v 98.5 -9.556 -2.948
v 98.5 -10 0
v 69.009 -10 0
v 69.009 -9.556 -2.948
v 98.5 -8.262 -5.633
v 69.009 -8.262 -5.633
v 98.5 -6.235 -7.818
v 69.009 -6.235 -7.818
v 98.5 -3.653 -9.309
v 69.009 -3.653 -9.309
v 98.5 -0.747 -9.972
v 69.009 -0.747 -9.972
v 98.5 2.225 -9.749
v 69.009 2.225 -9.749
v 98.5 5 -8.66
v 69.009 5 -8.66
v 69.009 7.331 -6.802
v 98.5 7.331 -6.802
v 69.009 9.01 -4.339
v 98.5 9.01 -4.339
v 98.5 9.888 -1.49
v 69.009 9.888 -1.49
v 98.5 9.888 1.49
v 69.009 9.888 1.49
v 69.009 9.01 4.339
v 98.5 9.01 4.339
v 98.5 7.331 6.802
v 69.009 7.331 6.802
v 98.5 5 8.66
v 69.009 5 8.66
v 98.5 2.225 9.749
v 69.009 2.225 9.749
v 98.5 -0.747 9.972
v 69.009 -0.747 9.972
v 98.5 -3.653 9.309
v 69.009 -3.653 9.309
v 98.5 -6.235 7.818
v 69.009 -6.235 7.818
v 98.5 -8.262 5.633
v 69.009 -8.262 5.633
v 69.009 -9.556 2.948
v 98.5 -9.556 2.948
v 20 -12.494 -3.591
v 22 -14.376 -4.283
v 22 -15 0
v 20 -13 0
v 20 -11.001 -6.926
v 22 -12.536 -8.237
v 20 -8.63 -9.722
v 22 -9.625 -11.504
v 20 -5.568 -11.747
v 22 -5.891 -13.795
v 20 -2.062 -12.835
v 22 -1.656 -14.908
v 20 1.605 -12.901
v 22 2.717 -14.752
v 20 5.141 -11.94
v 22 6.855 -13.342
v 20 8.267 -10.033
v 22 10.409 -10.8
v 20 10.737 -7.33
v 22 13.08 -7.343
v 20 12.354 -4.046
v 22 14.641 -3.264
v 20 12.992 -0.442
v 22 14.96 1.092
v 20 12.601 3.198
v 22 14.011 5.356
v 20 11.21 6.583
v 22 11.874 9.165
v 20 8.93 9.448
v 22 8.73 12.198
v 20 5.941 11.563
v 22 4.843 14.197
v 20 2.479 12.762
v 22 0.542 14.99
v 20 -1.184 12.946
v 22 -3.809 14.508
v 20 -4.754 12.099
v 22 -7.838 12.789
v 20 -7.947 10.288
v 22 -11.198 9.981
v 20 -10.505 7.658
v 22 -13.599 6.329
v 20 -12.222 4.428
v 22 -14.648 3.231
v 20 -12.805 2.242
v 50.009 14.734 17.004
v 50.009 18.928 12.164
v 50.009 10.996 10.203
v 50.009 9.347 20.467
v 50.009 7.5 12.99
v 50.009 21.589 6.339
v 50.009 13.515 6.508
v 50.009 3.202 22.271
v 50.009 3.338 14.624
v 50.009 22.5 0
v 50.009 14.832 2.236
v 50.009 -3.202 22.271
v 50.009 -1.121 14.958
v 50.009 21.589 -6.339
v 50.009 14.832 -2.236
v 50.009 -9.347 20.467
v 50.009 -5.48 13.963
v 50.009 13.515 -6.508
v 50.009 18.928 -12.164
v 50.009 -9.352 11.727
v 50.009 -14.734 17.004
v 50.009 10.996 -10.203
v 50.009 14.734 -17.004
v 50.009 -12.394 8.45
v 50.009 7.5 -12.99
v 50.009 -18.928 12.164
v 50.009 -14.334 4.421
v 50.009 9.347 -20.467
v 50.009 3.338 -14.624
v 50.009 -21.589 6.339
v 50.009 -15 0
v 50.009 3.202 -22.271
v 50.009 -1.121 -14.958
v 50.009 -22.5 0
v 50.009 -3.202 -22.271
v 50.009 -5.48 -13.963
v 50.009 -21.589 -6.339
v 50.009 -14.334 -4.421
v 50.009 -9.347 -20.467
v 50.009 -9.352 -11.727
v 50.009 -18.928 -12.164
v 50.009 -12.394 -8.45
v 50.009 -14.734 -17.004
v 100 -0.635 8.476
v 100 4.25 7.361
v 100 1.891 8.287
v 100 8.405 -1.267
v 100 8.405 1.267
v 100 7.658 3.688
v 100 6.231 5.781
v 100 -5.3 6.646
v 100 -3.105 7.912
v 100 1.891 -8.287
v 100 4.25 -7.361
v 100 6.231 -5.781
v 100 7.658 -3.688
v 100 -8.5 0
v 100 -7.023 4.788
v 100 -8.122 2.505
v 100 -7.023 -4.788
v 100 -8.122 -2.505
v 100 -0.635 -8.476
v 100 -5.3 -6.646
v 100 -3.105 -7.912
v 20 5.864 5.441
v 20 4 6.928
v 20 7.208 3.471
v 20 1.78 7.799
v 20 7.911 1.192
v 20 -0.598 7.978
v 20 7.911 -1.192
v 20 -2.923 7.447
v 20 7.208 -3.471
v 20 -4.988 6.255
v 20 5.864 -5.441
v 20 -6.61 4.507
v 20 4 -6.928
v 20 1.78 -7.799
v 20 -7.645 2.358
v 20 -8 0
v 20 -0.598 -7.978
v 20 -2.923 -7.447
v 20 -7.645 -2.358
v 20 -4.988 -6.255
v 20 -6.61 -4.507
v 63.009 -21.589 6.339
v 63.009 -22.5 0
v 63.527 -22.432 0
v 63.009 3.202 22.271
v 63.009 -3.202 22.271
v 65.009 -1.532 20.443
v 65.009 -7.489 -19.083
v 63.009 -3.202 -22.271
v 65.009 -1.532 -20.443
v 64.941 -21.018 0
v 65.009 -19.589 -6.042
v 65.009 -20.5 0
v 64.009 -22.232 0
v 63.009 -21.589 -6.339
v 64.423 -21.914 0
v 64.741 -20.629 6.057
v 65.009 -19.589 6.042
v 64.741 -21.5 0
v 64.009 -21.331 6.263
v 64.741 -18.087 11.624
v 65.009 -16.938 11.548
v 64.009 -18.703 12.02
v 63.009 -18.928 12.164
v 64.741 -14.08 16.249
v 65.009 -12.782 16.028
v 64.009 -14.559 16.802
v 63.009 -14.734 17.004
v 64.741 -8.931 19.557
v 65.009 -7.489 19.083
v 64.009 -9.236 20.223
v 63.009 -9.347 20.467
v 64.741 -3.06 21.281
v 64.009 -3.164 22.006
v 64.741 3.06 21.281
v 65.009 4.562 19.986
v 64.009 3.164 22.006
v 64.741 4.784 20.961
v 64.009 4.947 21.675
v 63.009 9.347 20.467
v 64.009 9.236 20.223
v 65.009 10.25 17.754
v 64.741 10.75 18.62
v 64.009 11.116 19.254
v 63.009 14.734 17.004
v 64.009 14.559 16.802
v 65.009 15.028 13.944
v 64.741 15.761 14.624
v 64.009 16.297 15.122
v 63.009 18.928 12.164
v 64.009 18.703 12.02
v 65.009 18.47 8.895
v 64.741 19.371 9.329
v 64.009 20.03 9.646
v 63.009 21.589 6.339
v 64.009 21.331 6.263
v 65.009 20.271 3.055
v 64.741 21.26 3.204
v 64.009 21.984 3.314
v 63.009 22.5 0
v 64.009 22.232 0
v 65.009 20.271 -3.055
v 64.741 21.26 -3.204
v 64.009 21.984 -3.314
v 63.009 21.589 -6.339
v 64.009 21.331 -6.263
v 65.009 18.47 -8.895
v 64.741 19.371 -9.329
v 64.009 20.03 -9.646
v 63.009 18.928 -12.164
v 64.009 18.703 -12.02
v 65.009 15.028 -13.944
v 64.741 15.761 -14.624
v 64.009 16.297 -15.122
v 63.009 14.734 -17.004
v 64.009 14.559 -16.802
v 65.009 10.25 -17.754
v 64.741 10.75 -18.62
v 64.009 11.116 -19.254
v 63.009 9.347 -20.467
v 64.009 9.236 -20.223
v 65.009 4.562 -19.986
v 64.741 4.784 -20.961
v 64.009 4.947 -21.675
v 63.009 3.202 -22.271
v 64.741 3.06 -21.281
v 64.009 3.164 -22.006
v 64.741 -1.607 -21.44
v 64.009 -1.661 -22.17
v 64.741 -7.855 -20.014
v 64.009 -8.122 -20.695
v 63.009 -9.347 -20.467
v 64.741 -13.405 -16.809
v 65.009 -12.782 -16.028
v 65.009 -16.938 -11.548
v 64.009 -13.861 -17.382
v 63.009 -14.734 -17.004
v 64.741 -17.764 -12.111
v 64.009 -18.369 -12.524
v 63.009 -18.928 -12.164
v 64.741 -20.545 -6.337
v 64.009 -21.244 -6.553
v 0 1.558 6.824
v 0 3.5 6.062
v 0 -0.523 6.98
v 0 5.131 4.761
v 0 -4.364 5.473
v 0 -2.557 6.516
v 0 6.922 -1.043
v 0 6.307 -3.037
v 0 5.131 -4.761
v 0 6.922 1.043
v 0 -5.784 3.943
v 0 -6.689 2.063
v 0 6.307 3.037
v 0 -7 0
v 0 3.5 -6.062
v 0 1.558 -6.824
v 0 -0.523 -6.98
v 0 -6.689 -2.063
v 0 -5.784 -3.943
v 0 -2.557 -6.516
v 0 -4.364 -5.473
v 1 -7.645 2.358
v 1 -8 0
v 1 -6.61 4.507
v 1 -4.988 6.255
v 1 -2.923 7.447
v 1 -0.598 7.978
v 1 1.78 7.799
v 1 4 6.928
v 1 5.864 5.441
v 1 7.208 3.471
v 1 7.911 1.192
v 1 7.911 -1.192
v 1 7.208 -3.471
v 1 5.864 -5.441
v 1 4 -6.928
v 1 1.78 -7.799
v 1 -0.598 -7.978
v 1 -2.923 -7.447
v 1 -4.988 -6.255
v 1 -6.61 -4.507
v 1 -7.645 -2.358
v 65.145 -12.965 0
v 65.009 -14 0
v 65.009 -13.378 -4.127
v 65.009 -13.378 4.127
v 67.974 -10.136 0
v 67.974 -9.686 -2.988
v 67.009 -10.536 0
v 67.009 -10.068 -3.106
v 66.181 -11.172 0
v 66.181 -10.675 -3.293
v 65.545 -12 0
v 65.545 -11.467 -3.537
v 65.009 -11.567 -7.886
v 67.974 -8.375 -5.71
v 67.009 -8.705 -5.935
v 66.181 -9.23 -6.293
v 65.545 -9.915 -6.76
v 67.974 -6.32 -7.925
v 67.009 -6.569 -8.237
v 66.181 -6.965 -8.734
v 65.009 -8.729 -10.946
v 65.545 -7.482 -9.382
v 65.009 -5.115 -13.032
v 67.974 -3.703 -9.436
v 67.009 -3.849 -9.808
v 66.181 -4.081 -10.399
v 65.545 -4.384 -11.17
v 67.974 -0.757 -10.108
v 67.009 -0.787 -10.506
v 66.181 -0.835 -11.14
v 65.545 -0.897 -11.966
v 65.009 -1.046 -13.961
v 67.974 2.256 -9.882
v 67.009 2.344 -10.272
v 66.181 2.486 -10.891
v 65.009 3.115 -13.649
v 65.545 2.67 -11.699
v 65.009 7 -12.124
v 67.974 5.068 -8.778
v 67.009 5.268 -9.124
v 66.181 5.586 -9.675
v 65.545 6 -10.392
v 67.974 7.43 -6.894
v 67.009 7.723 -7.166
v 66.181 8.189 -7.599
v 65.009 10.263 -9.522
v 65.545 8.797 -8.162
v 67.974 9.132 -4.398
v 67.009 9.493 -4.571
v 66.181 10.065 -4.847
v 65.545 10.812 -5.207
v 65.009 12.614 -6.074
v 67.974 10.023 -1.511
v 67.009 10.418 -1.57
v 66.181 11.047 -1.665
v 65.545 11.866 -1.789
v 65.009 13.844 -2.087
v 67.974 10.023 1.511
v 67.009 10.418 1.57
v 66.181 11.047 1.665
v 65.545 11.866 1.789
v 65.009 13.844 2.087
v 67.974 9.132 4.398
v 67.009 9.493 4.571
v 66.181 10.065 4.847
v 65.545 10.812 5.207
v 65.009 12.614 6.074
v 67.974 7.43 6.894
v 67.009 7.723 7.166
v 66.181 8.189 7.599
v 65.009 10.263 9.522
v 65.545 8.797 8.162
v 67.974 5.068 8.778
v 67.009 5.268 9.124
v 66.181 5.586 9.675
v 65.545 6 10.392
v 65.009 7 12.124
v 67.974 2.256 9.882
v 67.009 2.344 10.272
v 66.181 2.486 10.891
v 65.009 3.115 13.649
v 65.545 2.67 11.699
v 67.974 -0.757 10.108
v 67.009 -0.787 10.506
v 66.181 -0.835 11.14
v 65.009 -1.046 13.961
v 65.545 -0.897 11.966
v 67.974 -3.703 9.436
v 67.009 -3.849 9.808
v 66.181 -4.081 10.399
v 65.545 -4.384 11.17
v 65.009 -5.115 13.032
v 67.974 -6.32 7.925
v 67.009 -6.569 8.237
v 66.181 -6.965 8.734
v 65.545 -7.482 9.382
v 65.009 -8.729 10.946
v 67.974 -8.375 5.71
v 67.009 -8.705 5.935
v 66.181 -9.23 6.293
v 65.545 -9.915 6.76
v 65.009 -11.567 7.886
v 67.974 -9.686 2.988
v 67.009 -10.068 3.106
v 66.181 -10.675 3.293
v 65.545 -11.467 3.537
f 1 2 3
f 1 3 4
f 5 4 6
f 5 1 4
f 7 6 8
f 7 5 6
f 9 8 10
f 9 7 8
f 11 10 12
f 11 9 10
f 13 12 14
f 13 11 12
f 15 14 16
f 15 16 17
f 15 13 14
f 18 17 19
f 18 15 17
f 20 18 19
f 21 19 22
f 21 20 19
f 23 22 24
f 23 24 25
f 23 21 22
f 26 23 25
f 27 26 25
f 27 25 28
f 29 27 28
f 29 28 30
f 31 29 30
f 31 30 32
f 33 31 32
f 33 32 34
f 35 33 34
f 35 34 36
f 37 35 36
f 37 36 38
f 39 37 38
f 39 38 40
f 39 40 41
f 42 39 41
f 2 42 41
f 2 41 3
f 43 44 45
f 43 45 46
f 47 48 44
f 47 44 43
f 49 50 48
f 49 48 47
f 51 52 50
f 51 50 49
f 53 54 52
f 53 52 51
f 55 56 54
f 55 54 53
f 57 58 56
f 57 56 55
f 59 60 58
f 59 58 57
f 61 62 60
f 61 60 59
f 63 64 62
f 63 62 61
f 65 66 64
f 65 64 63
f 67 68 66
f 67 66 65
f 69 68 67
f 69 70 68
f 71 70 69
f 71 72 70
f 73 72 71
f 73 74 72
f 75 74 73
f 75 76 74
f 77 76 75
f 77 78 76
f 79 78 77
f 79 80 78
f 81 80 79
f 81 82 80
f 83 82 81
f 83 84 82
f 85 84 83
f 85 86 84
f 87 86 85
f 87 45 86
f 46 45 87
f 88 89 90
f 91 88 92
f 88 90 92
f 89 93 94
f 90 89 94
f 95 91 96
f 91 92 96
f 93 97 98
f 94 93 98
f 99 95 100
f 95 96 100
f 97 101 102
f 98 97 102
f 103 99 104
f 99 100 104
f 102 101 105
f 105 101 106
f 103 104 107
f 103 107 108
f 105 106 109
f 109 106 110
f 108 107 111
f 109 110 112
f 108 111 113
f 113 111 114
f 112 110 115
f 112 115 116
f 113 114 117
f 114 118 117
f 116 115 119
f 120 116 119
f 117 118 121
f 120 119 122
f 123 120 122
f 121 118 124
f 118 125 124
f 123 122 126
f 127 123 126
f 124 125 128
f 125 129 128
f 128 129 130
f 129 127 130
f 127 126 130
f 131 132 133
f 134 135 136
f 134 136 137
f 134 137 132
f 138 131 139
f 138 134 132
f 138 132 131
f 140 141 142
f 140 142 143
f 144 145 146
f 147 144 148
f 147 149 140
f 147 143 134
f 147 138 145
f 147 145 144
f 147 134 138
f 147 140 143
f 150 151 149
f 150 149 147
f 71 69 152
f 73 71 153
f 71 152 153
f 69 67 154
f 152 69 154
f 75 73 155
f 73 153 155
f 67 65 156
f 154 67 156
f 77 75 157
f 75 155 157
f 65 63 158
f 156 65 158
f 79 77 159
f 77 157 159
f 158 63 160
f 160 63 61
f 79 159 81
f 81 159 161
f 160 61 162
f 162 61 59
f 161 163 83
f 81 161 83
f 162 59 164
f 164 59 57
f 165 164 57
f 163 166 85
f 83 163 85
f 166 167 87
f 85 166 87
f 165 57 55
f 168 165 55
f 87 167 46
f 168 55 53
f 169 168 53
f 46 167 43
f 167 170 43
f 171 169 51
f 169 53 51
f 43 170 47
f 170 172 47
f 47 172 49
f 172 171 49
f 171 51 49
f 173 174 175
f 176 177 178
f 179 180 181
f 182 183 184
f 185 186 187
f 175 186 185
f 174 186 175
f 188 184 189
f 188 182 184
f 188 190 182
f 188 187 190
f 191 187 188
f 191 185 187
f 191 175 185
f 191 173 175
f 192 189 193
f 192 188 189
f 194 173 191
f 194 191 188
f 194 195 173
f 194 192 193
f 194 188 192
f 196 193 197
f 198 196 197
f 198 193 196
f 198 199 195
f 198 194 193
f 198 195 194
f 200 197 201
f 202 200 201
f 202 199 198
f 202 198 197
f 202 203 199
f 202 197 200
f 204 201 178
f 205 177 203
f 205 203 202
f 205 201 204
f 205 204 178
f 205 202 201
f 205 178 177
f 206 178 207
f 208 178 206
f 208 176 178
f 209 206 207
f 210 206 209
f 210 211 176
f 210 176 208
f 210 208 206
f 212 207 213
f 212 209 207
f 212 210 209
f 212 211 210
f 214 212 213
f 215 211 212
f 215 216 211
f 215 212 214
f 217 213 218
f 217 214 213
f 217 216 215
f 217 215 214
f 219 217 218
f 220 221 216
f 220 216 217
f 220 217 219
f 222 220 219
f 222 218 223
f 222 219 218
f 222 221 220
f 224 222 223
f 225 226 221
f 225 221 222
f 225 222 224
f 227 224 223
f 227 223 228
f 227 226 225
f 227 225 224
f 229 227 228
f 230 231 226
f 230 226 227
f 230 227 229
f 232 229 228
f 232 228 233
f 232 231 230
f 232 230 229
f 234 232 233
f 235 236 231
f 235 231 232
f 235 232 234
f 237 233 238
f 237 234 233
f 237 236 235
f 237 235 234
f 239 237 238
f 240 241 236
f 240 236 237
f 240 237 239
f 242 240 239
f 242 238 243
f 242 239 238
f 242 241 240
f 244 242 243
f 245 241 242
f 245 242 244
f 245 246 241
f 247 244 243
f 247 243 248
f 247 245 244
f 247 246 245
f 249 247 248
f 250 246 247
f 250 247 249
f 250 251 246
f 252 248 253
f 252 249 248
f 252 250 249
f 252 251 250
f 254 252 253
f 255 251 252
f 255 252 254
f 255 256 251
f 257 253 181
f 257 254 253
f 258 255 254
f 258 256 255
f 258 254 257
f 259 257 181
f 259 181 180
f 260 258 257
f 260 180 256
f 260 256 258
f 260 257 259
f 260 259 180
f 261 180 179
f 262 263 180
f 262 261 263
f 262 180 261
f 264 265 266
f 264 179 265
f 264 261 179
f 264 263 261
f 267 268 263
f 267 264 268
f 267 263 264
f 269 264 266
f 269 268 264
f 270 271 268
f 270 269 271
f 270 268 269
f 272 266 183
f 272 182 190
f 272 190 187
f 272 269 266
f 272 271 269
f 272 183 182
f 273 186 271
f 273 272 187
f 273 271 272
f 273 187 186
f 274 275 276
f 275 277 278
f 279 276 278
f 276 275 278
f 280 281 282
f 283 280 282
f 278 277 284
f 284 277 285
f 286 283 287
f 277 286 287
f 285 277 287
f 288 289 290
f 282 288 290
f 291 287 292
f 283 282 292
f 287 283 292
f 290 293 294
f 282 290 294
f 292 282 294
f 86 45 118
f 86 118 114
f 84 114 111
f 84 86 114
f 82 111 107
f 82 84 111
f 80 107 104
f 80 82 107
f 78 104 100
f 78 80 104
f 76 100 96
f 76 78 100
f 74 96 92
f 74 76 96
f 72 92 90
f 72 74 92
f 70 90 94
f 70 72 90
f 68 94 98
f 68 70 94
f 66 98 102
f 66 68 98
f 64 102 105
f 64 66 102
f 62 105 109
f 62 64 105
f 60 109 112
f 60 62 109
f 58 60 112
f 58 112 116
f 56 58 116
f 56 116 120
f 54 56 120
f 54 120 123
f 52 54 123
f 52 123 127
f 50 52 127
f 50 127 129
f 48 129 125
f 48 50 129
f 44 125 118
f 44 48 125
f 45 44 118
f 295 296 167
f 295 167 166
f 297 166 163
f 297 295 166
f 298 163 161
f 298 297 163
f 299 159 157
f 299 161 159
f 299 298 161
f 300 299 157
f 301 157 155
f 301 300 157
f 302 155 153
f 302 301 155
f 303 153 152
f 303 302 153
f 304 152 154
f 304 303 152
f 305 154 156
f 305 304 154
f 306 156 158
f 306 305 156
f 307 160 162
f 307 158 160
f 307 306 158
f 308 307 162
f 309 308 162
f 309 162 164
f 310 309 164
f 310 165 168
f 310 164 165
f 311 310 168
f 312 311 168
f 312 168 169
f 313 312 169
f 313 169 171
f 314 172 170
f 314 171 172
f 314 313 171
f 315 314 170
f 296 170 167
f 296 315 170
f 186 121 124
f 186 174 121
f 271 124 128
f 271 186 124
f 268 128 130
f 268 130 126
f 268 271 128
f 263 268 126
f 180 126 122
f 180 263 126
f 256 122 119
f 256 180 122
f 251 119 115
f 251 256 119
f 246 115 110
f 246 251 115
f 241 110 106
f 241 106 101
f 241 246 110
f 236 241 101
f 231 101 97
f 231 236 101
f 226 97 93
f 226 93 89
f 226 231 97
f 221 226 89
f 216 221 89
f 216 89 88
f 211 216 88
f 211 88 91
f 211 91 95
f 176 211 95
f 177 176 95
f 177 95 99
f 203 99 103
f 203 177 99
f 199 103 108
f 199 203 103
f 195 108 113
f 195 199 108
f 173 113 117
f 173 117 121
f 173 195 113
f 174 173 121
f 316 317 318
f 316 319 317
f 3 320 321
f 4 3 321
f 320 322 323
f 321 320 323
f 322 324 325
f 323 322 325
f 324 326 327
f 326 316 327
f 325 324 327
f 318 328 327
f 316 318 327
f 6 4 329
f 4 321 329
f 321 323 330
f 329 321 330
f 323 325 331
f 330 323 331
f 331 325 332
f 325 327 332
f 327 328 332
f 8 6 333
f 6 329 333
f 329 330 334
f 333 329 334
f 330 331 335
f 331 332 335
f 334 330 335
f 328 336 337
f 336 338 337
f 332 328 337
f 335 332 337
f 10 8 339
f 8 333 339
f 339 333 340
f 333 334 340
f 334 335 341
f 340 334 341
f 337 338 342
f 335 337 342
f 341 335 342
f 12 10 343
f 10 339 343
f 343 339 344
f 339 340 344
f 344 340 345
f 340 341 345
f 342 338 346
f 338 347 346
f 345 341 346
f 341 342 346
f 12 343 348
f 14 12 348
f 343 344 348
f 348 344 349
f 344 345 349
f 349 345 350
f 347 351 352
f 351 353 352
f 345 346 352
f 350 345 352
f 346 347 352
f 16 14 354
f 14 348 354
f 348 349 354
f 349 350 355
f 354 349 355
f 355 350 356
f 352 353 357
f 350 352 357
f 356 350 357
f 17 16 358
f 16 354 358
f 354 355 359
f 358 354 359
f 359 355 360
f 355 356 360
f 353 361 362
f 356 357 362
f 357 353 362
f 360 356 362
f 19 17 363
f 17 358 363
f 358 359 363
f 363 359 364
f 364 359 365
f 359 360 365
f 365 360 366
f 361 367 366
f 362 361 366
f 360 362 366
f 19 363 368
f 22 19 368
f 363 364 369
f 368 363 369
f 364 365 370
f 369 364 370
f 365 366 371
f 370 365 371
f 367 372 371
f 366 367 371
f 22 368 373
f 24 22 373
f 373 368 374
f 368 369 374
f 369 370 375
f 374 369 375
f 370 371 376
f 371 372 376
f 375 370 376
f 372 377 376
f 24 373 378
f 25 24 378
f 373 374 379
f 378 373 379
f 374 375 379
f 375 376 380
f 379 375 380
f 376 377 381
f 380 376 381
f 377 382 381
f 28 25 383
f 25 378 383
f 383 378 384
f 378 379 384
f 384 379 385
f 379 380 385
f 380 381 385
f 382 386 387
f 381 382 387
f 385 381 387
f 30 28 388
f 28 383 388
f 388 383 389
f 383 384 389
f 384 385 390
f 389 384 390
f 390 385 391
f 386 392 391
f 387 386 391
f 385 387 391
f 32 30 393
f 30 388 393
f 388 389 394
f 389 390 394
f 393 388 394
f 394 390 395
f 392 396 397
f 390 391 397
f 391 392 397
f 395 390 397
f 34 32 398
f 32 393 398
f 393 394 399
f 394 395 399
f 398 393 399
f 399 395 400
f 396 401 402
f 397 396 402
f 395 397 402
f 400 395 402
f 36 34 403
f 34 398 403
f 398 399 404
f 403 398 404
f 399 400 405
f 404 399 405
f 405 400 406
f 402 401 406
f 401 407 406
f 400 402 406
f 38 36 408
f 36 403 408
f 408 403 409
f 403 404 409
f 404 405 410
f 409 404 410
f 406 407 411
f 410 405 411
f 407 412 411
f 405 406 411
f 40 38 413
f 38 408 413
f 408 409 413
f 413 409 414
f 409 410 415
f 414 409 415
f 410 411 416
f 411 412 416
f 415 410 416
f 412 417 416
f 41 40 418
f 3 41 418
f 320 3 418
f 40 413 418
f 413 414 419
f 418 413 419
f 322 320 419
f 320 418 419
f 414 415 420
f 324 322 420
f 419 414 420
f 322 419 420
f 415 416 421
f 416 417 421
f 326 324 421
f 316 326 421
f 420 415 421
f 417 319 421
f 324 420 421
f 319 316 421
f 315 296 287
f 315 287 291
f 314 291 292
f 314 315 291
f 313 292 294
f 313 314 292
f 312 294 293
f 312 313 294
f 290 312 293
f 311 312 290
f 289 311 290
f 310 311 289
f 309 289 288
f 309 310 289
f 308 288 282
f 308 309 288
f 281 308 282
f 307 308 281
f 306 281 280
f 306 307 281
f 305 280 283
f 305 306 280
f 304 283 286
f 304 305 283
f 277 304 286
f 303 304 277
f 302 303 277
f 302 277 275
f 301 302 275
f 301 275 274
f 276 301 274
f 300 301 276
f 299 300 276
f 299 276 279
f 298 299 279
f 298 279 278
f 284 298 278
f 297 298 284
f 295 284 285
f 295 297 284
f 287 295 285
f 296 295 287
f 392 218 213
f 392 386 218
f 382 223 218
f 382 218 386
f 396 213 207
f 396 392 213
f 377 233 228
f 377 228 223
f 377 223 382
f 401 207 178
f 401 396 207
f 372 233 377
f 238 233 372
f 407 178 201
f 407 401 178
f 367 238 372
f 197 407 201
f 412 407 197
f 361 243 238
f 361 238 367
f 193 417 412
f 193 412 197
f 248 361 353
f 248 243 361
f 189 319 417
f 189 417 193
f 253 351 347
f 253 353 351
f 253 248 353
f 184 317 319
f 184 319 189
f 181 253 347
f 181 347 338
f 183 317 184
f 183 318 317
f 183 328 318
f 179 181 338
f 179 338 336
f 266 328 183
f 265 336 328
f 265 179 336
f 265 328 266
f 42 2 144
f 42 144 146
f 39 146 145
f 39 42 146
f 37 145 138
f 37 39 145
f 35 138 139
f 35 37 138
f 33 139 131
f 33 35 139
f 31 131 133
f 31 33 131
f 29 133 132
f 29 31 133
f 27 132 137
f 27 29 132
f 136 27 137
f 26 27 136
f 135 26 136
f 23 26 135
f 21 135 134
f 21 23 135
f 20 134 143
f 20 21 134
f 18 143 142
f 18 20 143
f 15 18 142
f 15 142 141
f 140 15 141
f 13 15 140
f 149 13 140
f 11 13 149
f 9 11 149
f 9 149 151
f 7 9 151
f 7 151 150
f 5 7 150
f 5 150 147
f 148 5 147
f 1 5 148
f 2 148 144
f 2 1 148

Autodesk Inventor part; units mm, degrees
ref_plane "YZ Plane" through (0, 0, 0) normal (1, 0, 0) x (0, 1, 0)
ref_plane "XZ Plane" through (0, 0, 0) normal (0, 1, 0) x (-1, 0, 0)
ref_plane "XY Plane" through (0, 0, 0) normal (0, 0, 1) x (1, 0, 0)
sketch "Sketch1" plane through (0, 0, 0) normal (0, 0, 1) x (1, 0, 0)
  line L0 (100, 10) -> (100, 0)
  line L1 (50.009, 15) -> (20.009, 15)
  line L2 (20.009, 15) -> (20.009, 15)
  line L3 (20.009, 15) -> (20, 15)
  line L4 (20, 15) -> (20, 8)
  line L5 (20, 8) -> (0, 8)
  line L6 (0, 8) -> (0, 0)
  line L7 (50.009, 15) -> (50.009, 22.5)
  line L8 (50.009, 22.5) -> (65.009, 22.5)
  line L9 (65.009, 22.5) -> (65.009, 10)
  line L10 (65.009, 10) -> (100, 10)
  line L11 (100, 10) -> (100, 10)
  line L12 (0, 0) -> (100, 0)
  dimension "d0" = 100
  dimension "d5" = 20
  dimension "d6" = 30
  dimension "d7" = 20
  dimension "d8" = 45
  dimension "d9" = 30
  dimension "d10" = 16
  dimension "d11" = 15
revolve "Revolution1" add sketch "Sketch1" angle 360 mid plane about axis through (0, 0, 0) along (1, 0, 0)
chamfer "Chamfer1" distance 1.5 angle 45 1 edges at (100, 10, 0)
fillet "Fillet1" radius 4 1 edges at (65.009, 10, 0)
fillet "Fillet2" radius 2 1 edges at (65.009, 22.5, 0)
chamfer "Chamfer2" distance 2 angle 45 1 edges at (20, 15, 0)
chamfer "Chamfer3" distance 1 angle 45 1 edges at (0, 8, 0)
